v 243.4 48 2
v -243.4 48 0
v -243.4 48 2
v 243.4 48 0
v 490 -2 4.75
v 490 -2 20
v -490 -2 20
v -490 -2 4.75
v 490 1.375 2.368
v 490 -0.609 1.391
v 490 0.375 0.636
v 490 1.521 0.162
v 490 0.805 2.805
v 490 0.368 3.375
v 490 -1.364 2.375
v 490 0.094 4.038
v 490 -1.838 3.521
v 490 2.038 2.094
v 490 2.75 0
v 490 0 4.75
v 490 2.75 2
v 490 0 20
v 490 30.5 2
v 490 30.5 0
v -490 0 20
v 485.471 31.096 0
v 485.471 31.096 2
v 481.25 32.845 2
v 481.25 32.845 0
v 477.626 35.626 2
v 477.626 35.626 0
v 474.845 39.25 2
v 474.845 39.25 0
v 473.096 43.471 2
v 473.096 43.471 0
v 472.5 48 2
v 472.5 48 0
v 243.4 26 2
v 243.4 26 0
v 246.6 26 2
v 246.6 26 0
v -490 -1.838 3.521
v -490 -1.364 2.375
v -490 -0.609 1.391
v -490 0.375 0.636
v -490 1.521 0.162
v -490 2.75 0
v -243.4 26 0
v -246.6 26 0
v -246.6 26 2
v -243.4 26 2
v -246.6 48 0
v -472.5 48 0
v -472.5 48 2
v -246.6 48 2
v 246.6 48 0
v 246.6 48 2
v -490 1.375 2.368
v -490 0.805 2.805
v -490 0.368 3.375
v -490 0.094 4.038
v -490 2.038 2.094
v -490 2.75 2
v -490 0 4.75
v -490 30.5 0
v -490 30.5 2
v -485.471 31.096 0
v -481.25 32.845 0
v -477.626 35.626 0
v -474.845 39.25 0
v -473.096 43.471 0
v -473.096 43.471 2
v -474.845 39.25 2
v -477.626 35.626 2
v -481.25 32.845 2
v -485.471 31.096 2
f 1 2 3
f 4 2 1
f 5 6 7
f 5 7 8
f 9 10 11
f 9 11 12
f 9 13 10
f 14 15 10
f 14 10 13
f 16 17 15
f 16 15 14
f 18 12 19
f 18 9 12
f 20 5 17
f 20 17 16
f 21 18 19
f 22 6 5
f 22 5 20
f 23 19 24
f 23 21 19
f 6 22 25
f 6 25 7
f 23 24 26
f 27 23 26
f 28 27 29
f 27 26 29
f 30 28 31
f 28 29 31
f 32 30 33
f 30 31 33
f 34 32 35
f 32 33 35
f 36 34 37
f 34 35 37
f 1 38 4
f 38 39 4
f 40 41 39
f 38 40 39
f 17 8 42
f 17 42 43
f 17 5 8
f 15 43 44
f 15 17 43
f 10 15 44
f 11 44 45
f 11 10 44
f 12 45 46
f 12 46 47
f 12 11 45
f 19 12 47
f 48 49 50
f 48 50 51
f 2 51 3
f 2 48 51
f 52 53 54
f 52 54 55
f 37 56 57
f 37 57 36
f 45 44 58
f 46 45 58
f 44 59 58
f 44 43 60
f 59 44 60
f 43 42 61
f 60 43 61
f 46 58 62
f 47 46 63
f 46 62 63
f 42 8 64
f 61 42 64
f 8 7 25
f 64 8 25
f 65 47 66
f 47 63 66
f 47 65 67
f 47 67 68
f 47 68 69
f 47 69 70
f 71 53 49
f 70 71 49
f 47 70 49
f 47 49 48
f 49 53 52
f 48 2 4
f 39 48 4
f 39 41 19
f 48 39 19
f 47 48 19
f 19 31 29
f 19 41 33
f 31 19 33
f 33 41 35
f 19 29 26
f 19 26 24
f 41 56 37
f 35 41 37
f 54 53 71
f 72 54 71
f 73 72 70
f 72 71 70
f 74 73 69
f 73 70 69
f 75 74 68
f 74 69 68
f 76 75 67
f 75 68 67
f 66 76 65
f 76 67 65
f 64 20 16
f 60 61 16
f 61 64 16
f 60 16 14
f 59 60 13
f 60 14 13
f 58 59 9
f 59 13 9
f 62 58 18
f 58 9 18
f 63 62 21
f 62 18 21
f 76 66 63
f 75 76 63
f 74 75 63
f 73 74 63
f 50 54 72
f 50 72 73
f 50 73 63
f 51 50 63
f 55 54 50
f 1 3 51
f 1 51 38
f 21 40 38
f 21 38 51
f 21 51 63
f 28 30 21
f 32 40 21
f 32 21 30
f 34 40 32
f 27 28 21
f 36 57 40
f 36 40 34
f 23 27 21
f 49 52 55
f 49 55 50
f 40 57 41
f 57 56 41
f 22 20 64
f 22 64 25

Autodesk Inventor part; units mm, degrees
ref_plane "YZ Plane" through (0, 0, 0) normal (1, 0, 0) x (0, 1, 0)
ref_plane "XZ Plane" through (0, 0, 0) normal (0, 1, 0) x (-1, 0, 0)
ref_plane "XY Plane" through (0, 0, 0) normal (0, 0, 1) x (1, 0, 0)
sketch "Sketch1" plane through (0, 0, 0) normal (0, 0, 1) x (1, 0, 0)
  line L0 (-490, 48) -> (490, 48)
  line L1 (490, 48) -> (490, 0)
  line L2 (490, 0) -> (-490, 0)
  line L3 (-490, 0) -> (-490, 48)
  point P0 (0, 0)
  point P1 (0, 0)
  dimension "d0" = 980
  dimension "d1" = 48
extrude "Plate1" add sketch "Sketch1" along normal blind 2
sketch "Sketch2" plane through (490, -2, 0) normal (0, 1, 0) x (-1, 0, 0)
  line L0 (980, 0) -> (0, 0)
  line L1 (0, 0) -> (0, 20)
  line L2 (0, 20) -> (980, 20)
  line L3 (980, 20) -> (980, 0)
edge flange "Flange1" height 20 angle 90 thickness 2 bend radius 2.75 thickness toward (0, 1, 0) relief round relief width 2 relief depth 1 edges at (0, 0, 2) wall of the first edge with corners at (-490, -2, 0) (490, -2, 0) (490, -2, 20) (-490, -2, 20)
bend "Bend1"
corner "Corner1"
sketch "Sketch5" plane through (0, 0, 0) normal (0, 0, -1) x (-1, 0, 0)
  line L0 (490, 48) -> (-490, 48) projected
  line L1 (490, -2) -> (-490, -2) projected
  circle A0 centre (0, 48) radius 17.5
  line L2 (243.4, 48) -> (246.6, 48)
  line L3 (246.6, 48) -> (246.6, 26)
  line L4 (246.6, 26) -> (243.4, 26)
  line L5 (243.4, 26) -> (243.4, 48)
  line L6 (-243.4, 48) -> (-246.6, 48)
  line L7 (-246.6, 48) -> (-246.6, 26)
  line L8 (-246.6, 26) -> (-243.4, 26)
  line L9 (-243.4, 26) -> (-243.4, 48)
  line L10 (0, 48) -> (0, -2) construction
  line L11 (490, -2) -> (490, 48)
  line L12 (-490, -2) -> (-490, 48)
  circle A1 centre (-490, 48) radius 17.5
  circle A2 centre (490, 48) radius 17.5
  point P0 (0, 0)
  point P1 (245, 26)
  point P2 (-245, 26)
  point P3 (246.6, 48)
  point P4 (-17.5, 48)
  point P5 (17.5, 48)
  point P6 (-246.6, 48)
  point P7 (472.5, 48)
  point P8 (490, 30.5)
  point P9 (-490, 30.5)
  point P10 (-472.5, 48)
  dimension "d45" = 35
  dimension "d48" = 3.2
  dimension "d49" = 490
  dimension "d51" = 28
  dimension "d52" = 22
extrude "Extrusion1" cut sketch "Sketch5" against normal through all contours L3 L4 L5 L0 | L0 L11 A2 | L9 L8 L7 L0 | L12 L0 A1 picked at (488.702, 36.4796) picked at (-478.4796, 46.702)
sketch "Sketch9" plane through (0, 0, 2) normal (0, 0, 1) x (1, 0, 0)
  line L0 (448.2795, 24.3045) -> (448.2795, 12.3045) construction
  line L1 (448.2795, 12.3045) -> (248.2795, 12.3045) construction
  line L2 (248.2795, 12.3045) -> (248.2795, 24.3045) construction
  line L3 (248.2795, 24.3045) -> (448.2795, 24.3045) construction
  line L4 (-490, 48) -> (490, 48) projected
  point P0 (0, 0)
  point P1 (1.05, 68)
  point P2 (490, 48)
  point P3 (-490, 48)
  dimension "d40" = 200
  dimension "d41" = 12
mark "Mark2"
equation "\"d2\" = Thickness"
equation "\"d3\" = BendReliefWidth"
equation "\"d4\" = BendReliefDepth"
equation "\"d5\" = MinimumRemnant"
equation "\"d6\" = TransitionRadius"
equation "\"d9\" = BendRadius"
equation "\"d10\" = CornerReliefSize"
equation "\"d11\" = GapSize"
equation "\"d12\" = JacobiRadiusSize"
equation "\"BendReliefWidth\" = Thickness"
equation "\"BendReliefDepth\" = 0.5 * Thickness"
equation "\"CornerReliefSize\" = 4 * Thickness"
equation "\"MinimumRemnant\" = 2 * Thickness"
equation "\"TransitionRadius\" = BendRadius"
equation "\"JacobiRadiusSize\" = BendRadius"
equation "\"GapSize\" = Thickness"
equation "\"Thickness\" = 2"
equation "\"BendRadius\" = 2.75"
properties part number "MSC 342 stringer BOARD  ##" material "Stainless Steel"
